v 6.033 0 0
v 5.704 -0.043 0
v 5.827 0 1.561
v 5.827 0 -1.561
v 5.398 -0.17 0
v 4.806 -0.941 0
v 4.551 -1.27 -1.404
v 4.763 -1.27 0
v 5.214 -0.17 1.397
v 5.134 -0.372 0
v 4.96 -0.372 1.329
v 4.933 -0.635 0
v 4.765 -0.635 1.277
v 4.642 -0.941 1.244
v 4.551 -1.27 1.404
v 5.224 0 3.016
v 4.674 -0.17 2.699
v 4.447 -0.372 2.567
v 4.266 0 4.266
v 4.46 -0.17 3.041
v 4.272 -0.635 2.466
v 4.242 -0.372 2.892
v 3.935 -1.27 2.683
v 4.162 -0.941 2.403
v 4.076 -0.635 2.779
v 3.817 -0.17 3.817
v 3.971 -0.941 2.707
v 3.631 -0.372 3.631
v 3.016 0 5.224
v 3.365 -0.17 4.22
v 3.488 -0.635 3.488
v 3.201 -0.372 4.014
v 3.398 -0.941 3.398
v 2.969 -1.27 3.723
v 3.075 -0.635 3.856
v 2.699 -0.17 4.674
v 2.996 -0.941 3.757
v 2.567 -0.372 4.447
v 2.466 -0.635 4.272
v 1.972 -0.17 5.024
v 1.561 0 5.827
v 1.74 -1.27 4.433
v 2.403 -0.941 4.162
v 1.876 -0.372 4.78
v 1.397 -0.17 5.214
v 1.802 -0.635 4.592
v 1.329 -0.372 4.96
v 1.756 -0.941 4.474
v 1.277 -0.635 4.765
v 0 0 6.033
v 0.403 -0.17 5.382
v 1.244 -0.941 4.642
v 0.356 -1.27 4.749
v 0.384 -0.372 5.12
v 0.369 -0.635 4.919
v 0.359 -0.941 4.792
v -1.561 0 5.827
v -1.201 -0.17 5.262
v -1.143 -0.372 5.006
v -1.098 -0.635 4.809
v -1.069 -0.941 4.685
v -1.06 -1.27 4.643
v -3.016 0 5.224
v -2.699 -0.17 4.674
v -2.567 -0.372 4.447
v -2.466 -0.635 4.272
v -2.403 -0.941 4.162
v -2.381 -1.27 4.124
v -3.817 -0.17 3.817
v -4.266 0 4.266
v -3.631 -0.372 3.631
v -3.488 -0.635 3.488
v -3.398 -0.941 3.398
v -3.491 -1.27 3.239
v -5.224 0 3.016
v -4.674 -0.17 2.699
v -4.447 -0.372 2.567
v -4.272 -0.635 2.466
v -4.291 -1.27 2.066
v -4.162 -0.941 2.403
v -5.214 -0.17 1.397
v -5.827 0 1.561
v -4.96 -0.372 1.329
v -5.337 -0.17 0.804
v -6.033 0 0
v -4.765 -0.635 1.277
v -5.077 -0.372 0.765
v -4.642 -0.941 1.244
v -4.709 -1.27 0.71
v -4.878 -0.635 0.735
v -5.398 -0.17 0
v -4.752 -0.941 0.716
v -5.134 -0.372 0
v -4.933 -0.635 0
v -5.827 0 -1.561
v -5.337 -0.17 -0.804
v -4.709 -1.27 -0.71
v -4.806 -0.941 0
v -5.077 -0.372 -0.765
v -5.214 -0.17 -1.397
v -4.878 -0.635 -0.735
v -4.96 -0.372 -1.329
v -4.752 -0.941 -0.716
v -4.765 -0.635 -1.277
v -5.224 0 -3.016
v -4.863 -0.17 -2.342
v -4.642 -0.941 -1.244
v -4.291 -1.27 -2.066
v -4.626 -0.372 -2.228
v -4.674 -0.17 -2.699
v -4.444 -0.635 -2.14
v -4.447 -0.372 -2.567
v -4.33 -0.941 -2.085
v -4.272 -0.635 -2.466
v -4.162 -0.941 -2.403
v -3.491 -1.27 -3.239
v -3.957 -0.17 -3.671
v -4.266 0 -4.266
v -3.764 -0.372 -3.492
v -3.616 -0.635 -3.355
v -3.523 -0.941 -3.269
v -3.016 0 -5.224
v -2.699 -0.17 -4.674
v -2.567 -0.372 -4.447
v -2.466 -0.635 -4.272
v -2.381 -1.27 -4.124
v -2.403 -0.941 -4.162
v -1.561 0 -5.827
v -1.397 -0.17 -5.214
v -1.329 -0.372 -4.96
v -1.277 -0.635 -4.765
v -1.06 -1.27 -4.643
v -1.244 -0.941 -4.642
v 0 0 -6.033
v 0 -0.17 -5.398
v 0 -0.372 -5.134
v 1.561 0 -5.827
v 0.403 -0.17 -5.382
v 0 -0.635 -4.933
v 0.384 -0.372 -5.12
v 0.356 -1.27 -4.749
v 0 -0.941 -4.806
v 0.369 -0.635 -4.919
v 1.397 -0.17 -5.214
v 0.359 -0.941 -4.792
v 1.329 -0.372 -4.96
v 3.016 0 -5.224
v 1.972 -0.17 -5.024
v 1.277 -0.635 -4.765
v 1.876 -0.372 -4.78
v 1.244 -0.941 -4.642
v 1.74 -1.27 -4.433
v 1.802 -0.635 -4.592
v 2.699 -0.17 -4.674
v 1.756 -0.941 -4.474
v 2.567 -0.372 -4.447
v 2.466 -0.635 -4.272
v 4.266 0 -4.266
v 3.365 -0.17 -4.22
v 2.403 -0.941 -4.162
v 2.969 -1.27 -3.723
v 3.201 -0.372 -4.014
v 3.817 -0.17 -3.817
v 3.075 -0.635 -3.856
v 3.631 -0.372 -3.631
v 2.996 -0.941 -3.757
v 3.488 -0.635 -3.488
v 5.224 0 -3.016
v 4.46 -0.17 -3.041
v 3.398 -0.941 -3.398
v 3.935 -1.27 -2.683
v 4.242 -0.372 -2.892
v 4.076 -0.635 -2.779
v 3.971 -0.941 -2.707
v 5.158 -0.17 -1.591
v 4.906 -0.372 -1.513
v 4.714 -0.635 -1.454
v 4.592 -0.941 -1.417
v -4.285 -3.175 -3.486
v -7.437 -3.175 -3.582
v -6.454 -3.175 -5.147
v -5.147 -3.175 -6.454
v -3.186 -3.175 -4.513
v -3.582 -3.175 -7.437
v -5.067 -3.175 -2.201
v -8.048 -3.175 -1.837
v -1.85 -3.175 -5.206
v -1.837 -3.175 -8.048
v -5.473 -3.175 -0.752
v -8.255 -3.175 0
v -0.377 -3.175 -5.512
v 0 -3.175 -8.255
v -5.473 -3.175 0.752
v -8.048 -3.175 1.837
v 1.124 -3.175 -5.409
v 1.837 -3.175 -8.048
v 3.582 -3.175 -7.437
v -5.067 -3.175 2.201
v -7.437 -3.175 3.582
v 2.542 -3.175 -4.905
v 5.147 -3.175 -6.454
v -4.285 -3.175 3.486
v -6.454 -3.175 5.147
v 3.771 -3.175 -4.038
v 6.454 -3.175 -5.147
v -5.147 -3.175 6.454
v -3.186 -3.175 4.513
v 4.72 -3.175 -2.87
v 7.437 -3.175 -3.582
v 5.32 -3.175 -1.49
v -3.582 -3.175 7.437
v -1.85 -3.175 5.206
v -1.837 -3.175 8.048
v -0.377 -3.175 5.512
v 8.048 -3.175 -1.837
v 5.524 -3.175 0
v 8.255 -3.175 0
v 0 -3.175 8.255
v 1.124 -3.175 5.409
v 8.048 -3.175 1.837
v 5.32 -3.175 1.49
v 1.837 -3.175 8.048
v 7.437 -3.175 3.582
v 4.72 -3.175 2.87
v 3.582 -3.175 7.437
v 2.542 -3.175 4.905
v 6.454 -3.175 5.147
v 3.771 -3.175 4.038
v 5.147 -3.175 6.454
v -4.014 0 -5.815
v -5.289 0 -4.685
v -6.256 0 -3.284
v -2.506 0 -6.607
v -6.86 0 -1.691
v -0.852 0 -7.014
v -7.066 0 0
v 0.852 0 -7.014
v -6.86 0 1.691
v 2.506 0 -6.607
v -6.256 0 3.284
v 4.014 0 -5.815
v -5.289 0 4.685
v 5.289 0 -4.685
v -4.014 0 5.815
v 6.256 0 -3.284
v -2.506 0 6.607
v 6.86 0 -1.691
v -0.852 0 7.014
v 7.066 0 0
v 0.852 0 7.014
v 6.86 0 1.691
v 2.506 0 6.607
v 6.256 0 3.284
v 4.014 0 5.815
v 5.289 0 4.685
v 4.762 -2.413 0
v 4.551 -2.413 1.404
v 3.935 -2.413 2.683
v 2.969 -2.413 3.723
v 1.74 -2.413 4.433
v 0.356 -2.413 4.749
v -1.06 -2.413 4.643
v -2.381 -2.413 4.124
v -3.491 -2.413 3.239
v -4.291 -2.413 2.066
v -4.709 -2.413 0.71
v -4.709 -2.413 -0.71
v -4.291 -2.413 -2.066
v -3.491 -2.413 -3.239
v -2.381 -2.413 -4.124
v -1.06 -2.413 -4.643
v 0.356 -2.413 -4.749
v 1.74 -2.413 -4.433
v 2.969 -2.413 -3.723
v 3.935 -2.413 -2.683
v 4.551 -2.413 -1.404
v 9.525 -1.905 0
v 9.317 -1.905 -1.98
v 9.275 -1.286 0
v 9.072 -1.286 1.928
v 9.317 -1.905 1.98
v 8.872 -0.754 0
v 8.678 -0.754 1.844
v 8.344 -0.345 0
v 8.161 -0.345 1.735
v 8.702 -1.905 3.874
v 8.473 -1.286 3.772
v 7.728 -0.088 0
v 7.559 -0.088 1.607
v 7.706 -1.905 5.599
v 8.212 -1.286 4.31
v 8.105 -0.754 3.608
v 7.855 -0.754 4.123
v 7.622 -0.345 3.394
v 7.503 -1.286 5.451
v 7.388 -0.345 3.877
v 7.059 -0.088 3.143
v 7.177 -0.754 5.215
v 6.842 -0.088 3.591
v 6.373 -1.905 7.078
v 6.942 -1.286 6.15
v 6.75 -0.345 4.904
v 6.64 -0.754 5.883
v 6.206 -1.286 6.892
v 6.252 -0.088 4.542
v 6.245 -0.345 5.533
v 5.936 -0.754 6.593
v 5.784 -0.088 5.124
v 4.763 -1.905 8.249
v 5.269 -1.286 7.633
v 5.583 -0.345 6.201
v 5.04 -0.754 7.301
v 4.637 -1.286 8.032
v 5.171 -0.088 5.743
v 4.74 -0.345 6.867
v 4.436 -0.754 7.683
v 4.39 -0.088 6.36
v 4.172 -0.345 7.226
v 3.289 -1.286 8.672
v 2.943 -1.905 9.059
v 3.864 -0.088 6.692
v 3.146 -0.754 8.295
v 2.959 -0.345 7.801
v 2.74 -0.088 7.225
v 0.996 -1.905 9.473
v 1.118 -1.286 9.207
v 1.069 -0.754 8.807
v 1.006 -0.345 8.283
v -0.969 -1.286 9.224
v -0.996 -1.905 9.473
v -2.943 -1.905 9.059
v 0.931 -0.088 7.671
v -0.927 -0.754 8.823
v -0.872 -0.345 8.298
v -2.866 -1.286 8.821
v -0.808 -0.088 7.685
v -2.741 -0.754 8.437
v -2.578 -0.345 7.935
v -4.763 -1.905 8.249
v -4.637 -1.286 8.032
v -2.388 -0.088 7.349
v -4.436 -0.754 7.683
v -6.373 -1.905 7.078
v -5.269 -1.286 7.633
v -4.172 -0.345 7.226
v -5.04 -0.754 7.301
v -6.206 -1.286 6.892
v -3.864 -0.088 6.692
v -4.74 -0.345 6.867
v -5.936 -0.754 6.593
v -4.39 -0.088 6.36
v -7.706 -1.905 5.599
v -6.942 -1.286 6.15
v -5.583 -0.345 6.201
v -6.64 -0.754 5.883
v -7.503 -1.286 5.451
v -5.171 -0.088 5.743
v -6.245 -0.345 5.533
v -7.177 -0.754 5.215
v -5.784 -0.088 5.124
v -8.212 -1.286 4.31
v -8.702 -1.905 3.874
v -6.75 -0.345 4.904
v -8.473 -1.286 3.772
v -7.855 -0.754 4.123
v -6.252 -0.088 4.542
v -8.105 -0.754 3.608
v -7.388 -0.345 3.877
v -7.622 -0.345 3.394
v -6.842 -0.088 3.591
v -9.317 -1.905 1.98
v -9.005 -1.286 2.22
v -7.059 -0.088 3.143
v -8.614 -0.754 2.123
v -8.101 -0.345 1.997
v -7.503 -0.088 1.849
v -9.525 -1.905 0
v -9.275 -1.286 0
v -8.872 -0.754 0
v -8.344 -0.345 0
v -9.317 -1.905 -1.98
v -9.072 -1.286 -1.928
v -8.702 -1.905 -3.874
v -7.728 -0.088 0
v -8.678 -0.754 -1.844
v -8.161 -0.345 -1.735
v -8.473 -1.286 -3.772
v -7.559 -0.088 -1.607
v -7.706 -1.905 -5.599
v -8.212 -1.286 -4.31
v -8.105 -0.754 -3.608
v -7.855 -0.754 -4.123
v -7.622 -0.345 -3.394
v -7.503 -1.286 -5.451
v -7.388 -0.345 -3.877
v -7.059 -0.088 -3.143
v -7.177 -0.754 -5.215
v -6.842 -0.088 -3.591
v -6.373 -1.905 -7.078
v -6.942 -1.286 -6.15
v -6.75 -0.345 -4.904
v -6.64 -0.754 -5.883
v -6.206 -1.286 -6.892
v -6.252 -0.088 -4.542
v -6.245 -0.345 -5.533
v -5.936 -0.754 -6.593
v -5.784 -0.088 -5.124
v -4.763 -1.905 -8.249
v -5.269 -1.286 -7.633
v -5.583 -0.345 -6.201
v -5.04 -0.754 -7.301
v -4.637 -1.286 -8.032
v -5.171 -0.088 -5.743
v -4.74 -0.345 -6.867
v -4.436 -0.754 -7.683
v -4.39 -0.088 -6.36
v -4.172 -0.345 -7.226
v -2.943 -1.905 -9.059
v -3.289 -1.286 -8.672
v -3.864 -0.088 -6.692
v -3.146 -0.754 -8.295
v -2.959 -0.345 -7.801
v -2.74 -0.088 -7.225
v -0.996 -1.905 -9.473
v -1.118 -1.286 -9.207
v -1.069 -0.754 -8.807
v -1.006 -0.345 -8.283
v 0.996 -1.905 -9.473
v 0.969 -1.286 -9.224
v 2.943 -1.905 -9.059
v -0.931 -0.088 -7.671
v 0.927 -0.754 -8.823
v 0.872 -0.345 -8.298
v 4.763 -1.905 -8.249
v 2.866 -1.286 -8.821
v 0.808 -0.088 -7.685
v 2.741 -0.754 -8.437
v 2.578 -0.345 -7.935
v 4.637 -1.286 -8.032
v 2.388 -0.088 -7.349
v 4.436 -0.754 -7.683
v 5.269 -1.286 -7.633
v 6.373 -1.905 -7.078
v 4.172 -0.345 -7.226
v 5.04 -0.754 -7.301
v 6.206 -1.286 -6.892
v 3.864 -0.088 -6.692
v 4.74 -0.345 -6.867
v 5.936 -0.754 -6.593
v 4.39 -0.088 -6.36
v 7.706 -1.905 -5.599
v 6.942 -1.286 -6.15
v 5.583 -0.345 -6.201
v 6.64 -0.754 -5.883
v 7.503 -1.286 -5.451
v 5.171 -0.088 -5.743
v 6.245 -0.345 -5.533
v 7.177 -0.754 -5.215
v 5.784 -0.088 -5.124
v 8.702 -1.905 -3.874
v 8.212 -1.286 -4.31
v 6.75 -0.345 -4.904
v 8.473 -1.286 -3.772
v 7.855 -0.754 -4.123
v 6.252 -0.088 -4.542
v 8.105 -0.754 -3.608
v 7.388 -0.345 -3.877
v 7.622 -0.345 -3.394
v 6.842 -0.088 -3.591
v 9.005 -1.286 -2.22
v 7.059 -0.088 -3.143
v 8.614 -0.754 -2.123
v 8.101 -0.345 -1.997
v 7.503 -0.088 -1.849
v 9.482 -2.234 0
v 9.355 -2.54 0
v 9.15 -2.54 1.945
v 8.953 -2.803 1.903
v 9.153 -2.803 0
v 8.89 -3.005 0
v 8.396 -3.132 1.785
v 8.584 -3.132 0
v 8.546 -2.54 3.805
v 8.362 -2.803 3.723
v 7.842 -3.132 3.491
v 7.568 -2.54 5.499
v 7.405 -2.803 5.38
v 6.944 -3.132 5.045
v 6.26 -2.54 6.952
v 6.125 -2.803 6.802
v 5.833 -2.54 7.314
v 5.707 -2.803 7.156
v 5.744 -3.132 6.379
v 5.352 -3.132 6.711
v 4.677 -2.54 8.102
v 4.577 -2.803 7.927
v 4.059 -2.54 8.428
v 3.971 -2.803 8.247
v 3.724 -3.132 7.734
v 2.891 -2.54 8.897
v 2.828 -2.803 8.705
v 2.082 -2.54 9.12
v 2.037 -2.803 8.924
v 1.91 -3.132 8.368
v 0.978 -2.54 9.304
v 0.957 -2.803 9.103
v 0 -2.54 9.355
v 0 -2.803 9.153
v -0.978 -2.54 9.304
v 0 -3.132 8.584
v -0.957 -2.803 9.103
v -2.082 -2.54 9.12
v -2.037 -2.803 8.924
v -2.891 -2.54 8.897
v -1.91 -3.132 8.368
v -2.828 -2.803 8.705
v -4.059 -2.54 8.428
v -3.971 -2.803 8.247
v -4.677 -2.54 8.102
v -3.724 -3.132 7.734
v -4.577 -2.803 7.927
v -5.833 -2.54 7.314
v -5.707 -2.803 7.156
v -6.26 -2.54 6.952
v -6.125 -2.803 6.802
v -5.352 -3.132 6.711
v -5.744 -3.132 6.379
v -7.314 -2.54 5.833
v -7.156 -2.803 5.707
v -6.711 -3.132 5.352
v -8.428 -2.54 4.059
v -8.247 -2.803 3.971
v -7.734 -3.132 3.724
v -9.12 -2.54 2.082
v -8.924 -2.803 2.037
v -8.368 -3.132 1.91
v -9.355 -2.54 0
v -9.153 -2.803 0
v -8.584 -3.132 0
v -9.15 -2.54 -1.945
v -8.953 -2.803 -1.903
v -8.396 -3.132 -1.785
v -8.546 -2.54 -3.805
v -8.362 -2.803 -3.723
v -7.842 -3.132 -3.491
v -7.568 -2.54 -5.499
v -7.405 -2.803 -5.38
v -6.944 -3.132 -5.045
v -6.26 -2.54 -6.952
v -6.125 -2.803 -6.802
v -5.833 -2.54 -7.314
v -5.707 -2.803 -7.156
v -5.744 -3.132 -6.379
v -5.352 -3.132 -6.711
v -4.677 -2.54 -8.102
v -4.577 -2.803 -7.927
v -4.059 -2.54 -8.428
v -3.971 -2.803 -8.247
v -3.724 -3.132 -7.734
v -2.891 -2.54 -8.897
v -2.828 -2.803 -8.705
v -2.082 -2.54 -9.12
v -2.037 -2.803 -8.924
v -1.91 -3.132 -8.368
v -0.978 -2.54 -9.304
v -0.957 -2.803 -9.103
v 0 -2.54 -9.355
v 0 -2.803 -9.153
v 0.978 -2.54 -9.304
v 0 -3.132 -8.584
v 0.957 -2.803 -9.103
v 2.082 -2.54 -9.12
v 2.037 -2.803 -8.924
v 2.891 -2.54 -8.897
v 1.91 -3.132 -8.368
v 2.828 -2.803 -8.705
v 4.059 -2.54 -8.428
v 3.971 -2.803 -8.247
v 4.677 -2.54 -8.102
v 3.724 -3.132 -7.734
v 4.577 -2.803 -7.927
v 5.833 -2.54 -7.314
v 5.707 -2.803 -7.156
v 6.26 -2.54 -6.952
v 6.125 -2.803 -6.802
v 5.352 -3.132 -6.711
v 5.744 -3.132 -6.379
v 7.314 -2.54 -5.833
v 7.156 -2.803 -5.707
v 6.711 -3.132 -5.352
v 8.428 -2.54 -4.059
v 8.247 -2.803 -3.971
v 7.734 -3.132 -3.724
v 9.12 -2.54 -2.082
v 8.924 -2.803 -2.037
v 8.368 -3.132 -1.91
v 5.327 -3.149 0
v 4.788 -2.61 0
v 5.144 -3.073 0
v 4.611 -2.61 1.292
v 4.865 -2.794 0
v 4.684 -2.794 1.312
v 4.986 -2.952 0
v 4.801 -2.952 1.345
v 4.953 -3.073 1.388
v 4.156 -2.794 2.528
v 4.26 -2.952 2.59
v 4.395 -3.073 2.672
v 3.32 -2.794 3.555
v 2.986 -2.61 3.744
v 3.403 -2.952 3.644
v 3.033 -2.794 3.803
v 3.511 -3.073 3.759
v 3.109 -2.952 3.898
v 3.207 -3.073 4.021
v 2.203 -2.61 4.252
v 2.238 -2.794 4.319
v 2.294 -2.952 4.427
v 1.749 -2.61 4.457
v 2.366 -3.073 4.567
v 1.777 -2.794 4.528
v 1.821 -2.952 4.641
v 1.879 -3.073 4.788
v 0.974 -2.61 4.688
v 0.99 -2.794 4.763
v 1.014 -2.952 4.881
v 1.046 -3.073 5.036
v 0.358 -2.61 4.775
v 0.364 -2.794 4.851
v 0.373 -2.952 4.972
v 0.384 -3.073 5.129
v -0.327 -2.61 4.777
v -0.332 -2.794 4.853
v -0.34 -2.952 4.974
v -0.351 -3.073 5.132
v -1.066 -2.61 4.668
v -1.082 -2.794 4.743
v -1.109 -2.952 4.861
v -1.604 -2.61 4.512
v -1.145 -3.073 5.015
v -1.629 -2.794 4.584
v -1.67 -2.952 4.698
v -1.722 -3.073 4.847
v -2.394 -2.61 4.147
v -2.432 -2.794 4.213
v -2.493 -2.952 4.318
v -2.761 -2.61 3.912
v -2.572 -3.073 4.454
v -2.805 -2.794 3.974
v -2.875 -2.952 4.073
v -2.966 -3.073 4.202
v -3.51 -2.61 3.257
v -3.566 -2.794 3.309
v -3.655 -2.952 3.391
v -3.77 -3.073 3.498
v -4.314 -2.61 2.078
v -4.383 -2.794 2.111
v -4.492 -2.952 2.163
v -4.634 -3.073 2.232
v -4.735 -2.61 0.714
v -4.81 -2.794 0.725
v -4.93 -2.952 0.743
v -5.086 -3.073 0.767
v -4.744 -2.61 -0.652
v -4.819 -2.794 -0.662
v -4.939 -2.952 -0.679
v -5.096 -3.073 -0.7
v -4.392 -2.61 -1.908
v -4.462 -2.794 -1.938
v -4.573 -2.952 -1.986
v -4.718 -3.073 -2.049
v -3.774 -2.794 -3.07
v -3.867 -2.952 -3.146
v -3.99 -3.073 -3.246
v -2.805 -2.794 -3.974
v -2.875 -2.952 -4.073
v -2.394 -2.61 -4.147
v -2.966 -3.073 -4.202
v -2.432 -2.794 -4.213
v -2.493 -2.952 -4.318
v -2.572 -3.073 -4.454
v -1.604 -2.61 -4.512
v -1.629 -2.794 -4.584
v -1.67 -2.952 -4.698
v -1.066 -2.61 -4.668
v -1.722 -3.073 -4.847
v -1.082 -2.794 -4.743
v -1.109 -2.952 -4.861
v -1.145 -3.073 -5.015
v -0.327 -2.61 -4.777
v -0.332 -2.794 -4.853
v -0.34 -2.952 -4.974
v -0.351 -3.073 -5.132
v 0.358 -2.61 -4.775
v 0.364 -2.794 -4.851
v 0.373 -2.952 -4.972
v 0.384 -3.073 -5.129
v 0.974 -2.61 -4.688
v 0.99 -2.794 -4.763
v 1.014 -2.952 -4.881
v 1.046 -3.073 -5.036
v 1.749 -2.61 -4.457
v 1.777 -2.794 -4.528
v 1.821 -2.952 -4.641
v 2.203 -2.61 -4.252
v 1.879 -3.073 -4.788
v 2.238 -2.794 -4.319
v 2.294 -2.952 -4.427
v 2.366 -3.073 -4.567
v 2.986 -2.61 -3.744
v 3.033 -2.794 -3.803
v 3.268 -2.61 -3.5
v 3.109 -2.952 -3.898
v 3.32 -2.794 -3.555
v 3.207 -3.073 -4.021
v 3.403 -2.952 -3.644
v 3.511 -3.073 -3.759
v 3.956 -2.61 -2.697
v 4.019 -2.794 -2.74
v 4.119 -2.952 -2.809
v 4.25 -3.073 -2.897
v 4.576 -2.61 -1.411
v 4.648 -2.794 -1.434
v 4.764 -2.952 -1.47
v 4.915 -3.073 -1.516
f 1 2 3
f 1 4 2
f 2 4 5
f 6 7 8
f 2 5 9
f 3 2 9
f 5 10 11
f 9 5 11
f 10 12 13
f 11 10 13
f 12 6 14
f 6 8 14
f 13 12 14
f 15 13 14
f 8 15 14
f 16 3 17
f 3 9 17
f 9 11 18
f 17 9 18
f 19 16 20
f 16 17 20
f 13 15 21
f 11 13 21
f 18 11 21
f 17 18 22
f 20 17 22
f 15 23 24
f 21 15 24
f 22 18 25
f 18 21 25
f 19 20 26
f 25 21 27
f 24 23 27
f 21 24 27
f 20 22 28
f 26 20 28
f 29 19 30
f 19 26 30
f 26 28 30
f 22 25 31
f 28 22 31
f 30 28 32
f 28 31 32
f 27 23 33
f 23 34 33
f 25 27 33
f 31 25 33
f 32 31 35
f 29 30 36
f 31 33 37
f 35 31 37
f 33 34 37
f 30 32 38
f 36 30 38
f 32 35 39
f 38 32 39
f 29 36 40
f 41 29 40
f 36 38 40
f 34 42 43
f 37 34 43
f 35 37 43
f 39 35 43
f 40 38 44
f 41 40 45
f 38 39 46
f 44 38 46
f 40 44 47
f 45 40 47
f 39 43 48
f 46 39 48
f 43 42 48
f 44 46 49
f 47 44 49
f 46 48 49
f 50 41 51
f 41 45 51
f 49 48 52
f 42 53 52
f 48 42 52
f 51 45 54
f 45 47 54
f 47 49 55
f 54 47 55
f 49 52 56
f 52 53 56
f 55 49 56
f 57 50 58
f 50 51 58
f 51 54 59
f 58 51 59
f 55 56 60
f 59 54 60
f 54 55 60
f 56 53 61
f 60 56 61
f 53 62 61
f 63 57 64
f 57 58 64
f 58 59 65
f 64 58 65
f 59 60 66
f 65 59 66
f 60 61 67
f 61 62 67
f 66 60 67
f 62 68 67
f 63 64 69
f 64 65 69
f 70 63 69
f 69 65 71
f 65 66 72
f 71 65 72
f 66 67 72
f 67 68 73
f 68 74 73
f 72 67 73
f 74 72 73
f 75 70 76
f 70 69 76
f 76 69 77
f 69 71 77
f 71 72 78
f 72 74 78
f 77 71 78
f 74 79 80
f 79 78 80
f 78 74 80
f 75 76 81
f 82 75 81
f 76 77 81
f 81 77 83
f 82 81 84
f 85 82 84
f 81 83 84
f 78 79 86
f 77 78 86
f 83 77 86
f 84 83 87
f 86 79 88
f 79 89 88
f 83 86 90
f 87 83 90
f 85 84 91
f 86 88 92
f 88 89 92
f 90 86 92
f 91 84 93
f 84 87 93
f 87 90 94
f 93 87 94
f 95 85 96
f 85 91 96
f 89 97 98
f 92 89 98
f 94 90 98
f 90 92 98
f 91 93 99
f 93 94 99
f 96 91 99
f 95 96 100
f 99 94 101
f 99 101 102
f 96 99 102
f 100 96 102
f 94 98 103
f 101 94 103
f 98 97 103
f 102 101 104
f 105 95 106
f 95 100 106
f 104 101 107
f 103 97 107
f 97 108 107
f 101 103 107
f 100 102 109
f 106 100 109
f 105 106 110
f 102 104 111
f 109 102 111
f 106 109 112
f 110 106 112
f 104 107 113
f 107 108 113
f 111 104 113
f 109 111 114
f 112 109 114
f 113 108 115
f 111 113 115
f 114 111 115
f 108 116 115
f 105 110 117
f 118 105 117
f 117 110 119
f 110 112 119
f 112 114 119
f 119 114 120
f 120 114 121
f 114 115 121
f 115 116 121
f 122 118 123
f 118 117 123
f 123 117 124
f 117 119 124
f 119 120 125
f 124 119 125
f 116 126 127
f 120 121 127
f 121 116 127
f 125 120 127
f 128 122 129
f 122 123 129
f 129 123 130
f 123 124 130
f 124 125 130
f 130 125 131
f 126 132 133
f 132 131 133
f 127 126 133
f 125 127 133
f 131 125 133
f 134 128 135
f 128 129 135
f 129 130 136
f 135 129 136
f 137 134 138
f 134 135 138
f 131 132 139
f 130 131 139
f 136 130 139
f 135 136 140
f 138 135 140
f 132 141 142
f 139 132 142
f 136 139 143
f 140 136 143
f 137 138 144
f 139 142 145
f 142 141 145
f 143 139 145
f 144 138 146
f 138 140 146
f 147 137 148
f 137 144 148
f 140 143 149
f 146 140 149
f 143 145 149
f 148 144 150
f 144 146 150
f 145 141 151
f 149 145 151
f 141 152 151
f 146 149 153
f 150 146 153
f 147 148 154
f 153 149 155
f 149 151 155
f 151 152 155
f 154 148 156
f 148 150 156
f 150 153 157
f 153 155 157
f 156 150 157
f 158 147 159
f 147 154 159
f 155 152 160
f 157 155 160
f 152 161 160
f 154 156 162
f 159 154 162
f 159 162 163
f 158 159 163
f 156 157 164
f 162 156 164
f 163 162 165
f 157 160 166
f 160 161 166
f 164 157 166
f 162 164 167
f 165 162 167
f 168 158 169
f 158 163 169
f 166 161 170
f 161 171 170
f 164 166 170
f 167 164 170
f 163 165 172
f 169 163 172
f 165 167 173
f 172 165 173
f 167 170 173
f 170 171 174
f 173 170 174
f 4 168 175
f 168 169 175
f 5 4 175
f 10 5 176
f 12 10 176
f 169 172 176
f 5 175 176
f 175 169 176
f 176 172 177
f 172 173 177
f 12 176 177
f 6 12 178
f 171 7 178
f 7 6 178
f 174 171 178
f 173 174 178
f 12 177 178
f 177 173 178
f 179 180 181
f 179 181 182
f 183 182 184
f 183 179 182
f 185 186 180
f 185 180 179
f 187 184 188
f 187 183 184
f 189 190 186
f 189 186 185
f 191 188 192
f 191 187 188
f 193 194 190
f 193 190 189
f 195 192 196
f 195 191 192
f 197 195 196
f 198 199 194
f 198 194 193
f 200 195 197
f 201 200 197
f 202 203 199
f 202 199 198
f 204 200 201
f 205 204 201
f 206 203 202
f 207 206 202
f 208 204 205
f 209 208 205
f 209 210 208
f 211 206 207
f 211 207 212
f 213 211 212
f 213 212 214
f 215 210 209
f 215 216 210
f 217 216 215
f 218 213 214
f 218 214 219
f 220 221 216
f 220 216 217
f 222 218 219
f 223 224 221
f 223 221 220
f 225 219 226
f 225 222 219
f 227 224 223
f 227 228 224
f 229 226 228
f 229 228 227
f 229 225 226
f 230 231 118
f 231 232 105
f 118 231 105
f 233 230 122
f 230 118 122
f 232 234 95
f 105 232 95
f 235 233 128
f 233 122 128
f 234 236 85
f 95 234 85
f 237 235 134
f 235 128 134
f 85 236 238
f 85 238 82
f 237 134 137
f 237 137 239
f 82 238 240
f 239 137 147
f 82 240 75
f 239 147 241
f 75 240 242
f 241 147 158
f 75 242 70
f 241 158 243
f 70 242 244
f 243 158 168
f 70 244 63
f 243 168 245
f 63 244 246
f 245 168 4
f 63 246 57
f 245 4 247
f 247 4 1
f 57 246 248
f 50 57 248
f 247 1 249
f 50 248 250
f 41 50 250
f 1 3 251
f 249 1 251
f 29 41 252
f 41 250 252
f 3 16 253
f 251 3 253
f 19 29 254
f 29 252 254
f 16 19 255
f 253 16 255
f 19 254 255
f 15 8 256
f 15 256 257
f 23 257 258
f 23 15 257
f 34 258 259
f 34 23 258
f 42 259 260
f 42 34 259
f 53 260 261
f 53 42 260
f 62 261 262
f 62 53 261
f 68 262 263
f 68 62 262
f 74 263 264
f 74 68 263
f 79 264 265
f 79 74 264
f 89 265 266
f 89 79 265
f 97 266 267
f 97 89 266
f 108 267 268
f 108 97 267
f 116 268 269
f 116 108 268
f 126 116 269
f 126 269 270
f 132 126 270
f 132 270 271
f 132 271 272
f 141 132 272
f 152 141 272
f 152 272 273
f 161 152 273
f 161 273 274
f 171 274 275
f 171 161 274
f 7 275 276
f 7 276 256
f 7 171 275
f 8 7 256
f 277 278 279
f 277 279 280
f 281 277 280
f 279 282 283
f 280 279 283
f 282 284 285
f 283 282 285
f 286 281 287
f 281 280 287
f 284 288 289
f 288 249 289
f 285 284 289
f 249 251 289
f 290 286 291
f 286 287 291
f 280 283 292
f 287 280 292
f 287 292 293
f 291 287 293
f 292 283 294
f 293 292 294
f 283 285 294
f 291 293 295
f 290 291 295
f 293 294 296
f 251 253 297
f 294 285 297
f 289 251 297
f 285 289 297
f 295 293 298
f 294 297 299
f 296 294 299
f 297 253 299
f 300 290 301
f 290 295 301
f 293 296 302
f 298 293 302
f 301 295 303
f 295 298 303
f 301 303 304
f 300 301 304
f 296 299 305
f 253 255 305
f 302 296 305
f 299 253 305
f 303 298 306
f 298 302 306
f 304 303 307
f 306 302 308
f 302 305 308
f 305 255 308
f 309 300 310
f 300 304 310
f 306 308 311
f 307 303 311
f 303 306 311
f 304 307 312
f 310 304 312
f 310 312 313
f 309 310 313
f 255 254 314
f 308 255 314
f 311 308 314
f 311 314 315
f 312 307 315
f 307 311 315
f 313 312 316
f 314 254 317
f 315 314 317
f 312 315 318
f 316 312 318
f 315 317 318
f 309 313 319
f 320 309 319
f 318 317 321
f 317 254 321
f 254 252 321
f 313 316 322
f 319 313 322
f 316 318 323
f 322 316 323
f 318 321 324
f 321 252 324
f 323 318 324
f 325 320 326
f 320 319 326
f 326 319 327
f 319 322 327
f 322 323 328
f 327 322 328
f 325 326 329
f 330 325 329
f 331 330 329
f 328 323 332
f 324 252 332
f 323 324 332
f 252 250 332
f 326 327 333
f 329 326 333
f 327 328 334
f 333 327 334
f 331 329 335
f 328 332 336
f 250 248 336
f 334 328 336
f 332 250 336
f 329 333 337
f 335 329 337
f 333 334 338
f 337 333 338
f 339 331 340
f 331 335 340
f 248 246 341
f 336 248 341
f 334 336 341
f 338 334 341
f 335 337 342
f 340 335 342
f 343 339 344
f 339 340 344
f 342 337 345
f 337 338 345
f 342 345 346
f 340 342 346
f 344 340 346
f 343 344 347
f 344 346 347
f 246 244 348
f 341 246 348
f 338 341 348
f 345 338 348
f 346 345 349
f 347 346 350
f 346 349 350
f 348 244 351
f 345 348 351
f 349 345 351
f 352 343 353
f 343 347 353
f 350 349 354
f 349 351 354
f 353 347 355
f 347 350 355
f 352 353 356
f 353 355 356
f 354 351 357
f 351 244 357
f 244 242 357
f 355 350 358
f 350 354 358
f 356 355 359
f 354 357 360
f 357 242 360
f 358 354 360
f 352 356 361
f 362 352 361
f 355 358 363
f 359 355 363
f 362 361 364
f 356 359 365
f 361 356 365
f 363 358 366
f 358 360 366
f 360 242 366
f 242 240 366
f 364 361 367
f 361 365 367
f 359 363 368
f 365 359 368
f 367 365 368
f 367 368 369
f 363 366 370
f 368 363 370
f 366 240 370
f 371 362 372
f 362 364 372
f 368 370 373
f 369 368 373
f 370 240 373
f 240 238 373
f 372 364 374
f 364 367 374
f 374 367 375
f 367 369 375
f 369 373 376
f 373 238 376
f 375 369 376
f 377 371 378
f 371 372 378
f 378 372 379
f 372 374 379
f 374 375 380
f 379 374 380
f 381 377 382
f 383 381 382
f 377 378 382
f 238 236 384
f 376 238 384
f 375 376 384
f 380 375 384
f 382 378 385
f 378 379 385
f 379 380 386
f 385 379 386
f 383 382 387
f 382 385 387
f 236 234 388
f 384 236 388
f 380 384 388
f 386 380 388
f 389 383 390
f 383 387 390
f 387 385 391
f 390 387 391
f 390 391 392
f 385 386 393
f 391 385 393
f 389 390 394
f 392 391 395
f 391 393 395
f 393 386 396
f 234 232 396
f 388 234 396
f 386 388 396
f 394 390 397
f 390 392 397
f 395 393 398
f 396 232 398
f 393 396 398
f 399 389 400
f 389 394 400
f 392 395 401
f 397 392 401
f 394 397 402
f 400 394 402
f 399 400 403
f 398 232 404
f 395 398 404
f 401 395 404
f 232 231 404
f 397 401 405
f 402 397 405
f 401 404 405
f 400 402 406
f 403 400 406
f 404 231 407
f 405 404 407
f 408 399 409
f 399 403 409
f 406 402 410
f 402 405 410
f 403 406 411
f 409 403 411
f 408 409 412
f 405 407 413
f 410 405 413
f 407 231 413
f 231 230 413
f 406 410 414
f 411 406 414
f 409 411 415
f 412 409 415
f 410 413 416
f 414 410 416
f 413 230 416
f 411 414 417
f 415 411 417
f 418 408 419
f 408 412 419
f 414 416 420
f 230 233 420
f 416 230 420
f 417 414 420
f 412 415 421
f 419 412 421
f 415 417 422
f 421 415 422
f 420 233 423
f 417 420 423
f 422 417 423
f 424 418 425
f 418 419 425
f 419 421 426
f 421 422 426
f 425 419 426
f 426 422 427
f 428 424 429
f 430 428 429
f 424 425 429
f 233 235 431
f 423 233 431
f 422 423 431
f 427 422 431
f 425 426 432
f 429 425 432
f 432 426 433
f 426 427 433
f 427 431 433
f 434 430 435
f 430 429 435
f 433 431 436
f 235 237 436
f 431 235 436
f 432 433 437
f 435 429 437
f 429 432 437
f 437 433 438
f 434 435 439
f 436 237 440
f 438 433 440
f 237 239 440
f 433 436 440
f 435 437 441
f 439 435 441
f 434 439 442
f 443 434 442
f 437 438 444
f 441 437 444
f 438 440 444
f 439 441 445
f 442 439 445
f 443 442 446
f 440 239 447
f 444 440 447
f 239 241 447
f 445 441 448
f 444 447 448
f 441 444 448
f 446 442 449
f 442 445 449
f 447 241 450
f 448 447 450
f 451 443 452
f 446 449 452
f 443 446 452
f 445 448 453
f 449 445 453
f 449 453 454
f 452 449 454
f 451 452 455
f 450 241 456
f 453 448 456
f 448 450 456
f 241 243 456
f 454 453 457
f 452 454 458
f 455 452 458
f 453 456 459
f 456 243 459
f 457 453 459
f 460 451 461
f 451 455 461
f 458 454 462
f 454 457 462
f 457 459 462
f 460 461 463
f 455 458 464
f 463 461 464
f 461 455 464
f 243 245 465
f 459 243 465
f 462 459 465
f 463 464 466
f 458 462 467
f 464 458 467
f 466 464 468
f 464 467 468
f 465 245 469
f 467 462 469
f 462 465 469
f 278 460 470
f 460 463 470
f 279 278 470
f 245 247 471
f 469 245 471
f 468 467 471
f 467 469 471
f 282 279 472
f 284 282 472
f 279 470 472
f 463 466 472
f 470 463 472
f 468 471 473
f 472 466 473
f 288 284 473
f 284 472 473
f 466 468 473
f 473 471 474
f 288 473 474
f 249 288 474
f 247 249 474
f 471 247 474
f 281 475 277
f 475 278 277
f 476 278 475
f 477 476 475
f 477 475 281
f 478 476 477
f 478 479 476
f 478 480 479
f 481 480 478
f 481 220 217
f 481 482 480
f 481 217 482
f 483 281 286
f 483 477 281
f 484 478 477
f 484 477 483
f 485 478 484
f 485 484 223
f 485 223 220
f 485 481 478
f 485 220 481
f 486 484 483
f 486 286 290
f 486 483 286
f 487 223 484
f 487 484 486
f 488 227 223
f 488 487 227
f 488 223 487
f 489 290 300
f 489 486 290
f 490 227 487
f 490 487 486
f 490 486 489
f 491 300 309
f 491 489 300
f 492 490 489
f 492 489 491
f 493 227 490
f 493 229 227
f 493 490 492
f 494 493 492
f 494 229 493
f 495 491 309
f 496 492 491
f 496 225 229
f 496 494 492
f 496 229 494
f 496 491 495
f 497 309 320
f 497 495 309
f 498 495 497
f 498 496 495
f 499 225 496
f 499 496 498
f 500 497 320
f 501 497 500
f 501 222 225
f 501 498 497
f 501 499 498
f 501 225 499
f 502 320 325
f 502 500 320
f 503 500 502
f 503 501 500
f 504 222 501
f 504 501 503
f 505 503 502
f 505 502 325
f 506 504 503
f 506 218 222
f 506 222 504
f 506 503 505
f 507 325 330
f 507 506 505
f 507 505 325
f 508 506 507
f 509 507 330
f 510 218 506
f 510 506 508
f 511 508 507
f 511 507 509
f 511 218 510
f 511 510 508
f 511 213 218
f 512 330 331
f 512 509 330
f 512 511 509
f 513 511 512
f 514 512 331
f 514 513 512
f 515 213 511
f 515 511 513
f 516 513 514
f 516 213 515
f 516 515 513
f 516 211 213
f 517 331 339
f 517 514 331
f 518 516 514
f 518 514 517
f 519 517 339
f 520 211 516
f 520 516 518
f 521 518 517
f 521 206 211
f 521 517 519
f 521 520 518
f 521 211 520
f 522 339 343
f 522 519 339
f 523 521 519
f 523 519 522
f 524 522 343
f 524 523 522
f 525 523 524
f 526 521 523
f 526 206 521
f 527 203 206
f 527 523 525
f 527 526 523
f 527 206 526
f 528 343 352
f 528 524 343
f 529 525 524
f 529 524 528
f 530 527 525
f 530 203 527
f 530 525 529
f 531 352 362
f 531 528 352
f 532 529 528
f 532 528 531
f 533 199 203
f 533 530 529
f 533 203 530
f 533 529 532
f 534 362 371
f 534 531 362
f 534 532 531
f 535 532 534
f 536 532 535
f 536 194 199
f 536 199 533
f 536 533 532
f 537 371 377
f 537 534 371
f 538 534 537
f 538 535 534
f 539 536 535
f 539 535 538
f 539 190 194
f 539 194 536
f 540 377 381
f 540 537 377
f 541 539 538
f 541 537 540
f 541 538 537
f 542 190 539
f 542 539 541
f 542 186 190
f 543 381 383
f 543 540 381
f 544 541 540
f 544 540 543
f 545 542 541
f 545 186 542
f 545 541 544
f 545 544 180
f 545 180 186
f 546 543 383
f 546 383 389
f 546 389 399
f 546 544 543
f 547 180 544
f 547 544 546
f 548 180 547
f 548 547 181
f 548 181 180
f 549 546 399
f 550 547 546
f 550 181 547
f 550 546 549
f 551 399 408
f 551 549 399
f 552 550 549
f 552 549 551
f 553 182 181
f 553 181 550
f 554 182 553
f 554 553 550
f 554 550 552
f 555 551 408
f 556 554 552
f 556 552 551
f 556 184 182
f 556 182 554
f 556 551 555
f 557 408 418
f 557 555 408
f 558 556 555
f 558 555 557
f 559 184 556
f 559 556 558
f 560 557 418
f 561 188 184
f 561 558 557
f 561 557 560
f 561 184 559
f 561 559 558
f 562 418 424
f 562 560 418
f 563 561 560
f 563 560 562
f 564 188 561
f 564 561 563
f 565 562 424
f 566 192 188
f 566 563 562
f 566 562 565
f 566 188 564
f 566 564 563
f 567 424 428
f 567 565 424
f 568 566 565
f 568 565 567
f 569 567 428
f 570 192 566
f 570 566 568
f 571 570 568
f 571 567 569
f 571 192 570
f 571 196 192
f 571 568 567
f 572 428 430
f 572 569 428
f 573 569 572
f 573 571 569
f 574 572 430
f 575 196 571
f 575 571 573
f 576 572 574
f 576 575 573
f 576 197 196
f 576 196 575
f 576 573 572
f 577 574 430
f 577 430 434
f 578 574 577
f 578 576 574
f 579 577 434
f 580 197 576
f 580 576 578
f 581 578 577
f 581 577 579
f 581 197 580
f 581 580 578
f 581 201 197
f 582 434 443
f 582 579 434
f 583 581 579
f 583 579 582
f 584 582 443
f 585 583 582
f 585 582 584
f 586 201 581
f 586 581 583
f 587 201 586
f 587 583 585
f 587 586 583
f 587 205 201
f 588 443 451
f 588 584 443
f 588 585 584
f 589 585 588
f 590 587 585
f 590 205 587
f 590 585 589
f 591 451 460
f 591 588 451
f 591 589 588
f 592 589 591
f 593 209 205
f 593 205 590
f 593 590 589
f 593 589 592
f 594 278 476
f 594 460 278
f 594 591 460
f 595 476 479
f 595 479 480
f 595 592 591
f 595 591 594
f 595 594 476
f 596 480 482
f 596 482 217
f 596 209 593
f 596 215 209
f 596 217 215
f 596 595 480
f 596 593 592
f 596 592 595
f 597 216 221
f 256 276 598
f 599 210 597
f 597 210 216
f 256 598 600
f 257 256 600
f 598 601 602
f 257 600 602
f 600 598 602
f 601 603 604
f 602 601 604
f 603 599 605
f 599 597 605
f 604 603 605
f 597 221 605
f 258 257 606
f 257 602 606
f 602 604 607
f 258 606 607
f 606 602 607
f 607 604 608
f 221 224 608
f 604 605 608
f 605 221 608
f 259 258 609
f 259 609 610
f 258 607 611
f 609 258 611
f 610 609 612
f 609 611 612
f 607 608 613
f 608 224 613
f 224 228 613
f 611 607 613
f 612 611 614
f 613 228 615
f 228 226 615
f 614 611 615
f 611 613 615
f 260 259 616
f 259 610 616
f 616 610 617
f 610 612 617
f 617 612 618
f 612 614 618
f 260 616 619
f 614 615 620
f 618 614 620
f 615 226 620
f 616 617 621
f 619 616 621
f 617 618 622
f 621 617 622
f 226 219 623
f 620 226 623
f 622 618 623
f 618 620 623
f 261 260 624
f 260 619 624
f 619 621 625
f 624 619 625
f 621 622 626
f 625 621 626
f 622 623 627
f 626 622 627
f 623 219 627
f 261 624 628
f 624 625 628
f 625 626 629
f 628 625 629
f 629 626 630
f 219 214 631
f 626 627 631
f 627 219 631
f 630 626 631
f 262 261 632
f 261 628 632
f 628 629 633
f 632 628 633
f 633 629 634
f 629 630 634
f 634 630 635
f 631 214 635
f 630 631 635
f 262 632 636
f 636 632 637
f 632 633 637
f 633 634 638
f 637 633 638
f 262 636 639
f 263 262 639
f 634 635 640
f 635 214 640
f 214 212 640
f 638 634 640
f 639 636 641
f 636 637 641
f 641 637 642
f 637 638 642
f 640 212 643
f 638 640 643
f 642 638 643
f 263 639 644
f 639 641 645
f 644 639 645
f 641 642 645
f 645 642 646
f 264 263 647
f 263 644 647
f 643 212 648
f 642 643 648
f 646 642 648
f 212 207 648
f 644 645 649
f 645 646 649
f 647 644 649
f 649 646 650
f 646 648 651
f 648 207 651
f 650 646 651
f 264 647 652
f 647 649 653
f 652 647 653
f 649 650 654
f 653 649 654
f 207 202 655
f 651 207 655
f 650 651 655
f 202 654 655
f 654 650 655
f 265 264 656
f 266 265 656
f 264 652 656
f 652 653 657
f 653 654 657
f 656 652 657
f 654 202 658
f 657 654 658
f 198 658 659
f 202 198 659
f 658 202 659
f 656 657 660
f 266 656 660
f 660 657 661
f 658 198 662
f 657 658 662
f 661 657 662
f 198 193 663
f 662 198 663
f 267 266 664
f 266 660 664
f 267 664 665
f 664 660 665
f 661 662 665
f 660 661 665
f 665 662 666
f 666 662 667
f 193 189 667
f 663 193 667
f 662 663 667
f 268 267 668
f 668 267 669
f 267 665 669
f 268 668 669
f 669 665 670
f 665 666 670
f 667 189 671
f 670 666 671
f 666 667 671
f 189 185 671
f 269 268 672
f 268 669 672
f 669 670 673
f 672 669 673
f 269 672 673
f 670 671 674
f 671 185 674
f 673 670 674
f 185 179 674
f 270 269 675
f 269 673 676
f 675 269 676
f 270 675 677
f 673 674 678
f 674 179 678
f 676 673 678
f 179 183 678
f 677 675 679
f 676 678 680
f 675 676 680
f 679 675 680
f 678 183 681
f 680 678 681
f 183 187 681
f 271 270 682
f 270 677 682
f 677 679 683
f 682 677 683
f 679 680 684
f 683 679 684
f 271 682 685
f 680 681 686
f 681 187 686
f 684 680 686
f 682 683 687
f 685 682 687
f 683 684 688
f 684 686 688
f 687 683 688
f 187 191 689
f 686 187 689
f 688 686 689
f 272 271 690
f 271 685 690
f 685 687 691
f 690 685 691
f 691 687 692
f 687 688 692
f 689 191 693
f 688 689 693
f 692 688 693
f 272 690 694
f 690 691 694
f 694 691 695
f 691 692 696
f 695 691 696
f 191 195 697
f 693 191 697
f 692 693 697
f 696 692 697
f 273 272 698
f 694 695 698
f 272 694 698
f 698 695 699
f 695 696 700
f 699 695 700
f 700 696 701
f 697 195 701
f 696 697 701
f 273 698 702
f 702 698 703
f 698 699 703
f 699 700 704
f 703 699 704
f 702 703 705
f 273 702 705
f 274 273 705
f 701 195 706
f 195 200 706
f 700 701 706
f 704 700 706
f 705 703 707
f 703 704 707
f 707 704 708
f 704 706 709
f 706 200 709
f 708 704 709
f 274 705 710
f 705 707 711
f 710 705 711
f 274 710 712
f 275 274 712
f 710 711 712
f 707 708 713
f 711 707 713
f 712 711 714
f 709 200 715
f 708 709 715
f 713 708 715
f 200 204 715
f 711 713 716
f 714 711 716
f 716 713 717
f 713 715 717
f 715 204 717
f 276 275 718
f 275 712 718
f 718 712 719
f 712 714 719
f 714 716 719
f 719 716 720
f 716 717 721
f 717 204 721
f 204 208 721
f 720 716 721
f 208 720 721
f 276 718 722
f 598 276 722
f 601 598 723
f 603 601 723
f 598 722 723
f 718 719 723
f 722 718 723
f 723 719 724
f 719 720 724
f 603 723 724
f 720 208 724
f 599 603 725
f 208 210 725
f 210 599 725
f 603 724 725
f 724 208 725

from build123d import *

# Parameters (mm, degrees)
F0_R     = 9.525
F0_R_2   = 4.7625
F1_DEPTH = 3.175
F2_R     = 1.27
F4_R     = 1.27
F5_R     = 0.762


# Not quite as in the source:
# - a fillet or chamfer that OpenCascade refuses, or shapes differently, is made with other operations: its cross-section is extruded or revolved along the edge and cut away or added


with BuildPart() as f1:
    # F0 (on Front) → F1 (new body)
    with BuildSketch(Plane.XZ):
        Circle(F0_R)
        Circle(F0_R_2, mode=Mode.SUBTRACT)
    extrude(amount=F1_DEPTH)

    # F2
    f2_edges = [f1.edges().sort_by_distance(p)[0] for p in [
        (-9.525, -3.175, 0),
    ]]
    fillet(f2_edges, radius=F2_R)

    # F3: fillet of radius 2.54 on 1 edges, made by hand

    # F3_s1 → F3_t2 (revolve, cut)
    with BuildSketch(Plane.XY):
        with BuildLine():
            ThreePointArc((9.525, -1.905), (8.6210815618, -0.5319536858), (7.0656555752, 0))
            Line((7.0656555752, 0), (7.0656555752, 0.0508))
            Line((7.0656555752, 0.0508), (9.525, 0.0508))
            Line((9.525, 0.0508), (9.5758, 0))
            ThreePointArc((9.5758, 0), (9.5758, -0.9525), (9.5741868885, -1.8923))
            Line((9.5741868885, -1.8923), (9.525, -1.905))
        make_face()
    revolve(axis=Axis((0, 0, 0), (0, -1, 0)), mode=Mode.SUBTRACT)

    # F4
    f4_edges = [f1.edges().sort_by_distance(p)[0] for p in [
        (-4.7625, 0, 0),
    ]]
    fillet(f4_edges, radius=F4_R)

    # F5
    f5_edges = [f1.edges().sort_by_distance(p)[0] for p in [
        (-4.7625, -3.175, 0),
    ]]
    fillet(f5_edges, radius=F5_R)


solid = f1.part
